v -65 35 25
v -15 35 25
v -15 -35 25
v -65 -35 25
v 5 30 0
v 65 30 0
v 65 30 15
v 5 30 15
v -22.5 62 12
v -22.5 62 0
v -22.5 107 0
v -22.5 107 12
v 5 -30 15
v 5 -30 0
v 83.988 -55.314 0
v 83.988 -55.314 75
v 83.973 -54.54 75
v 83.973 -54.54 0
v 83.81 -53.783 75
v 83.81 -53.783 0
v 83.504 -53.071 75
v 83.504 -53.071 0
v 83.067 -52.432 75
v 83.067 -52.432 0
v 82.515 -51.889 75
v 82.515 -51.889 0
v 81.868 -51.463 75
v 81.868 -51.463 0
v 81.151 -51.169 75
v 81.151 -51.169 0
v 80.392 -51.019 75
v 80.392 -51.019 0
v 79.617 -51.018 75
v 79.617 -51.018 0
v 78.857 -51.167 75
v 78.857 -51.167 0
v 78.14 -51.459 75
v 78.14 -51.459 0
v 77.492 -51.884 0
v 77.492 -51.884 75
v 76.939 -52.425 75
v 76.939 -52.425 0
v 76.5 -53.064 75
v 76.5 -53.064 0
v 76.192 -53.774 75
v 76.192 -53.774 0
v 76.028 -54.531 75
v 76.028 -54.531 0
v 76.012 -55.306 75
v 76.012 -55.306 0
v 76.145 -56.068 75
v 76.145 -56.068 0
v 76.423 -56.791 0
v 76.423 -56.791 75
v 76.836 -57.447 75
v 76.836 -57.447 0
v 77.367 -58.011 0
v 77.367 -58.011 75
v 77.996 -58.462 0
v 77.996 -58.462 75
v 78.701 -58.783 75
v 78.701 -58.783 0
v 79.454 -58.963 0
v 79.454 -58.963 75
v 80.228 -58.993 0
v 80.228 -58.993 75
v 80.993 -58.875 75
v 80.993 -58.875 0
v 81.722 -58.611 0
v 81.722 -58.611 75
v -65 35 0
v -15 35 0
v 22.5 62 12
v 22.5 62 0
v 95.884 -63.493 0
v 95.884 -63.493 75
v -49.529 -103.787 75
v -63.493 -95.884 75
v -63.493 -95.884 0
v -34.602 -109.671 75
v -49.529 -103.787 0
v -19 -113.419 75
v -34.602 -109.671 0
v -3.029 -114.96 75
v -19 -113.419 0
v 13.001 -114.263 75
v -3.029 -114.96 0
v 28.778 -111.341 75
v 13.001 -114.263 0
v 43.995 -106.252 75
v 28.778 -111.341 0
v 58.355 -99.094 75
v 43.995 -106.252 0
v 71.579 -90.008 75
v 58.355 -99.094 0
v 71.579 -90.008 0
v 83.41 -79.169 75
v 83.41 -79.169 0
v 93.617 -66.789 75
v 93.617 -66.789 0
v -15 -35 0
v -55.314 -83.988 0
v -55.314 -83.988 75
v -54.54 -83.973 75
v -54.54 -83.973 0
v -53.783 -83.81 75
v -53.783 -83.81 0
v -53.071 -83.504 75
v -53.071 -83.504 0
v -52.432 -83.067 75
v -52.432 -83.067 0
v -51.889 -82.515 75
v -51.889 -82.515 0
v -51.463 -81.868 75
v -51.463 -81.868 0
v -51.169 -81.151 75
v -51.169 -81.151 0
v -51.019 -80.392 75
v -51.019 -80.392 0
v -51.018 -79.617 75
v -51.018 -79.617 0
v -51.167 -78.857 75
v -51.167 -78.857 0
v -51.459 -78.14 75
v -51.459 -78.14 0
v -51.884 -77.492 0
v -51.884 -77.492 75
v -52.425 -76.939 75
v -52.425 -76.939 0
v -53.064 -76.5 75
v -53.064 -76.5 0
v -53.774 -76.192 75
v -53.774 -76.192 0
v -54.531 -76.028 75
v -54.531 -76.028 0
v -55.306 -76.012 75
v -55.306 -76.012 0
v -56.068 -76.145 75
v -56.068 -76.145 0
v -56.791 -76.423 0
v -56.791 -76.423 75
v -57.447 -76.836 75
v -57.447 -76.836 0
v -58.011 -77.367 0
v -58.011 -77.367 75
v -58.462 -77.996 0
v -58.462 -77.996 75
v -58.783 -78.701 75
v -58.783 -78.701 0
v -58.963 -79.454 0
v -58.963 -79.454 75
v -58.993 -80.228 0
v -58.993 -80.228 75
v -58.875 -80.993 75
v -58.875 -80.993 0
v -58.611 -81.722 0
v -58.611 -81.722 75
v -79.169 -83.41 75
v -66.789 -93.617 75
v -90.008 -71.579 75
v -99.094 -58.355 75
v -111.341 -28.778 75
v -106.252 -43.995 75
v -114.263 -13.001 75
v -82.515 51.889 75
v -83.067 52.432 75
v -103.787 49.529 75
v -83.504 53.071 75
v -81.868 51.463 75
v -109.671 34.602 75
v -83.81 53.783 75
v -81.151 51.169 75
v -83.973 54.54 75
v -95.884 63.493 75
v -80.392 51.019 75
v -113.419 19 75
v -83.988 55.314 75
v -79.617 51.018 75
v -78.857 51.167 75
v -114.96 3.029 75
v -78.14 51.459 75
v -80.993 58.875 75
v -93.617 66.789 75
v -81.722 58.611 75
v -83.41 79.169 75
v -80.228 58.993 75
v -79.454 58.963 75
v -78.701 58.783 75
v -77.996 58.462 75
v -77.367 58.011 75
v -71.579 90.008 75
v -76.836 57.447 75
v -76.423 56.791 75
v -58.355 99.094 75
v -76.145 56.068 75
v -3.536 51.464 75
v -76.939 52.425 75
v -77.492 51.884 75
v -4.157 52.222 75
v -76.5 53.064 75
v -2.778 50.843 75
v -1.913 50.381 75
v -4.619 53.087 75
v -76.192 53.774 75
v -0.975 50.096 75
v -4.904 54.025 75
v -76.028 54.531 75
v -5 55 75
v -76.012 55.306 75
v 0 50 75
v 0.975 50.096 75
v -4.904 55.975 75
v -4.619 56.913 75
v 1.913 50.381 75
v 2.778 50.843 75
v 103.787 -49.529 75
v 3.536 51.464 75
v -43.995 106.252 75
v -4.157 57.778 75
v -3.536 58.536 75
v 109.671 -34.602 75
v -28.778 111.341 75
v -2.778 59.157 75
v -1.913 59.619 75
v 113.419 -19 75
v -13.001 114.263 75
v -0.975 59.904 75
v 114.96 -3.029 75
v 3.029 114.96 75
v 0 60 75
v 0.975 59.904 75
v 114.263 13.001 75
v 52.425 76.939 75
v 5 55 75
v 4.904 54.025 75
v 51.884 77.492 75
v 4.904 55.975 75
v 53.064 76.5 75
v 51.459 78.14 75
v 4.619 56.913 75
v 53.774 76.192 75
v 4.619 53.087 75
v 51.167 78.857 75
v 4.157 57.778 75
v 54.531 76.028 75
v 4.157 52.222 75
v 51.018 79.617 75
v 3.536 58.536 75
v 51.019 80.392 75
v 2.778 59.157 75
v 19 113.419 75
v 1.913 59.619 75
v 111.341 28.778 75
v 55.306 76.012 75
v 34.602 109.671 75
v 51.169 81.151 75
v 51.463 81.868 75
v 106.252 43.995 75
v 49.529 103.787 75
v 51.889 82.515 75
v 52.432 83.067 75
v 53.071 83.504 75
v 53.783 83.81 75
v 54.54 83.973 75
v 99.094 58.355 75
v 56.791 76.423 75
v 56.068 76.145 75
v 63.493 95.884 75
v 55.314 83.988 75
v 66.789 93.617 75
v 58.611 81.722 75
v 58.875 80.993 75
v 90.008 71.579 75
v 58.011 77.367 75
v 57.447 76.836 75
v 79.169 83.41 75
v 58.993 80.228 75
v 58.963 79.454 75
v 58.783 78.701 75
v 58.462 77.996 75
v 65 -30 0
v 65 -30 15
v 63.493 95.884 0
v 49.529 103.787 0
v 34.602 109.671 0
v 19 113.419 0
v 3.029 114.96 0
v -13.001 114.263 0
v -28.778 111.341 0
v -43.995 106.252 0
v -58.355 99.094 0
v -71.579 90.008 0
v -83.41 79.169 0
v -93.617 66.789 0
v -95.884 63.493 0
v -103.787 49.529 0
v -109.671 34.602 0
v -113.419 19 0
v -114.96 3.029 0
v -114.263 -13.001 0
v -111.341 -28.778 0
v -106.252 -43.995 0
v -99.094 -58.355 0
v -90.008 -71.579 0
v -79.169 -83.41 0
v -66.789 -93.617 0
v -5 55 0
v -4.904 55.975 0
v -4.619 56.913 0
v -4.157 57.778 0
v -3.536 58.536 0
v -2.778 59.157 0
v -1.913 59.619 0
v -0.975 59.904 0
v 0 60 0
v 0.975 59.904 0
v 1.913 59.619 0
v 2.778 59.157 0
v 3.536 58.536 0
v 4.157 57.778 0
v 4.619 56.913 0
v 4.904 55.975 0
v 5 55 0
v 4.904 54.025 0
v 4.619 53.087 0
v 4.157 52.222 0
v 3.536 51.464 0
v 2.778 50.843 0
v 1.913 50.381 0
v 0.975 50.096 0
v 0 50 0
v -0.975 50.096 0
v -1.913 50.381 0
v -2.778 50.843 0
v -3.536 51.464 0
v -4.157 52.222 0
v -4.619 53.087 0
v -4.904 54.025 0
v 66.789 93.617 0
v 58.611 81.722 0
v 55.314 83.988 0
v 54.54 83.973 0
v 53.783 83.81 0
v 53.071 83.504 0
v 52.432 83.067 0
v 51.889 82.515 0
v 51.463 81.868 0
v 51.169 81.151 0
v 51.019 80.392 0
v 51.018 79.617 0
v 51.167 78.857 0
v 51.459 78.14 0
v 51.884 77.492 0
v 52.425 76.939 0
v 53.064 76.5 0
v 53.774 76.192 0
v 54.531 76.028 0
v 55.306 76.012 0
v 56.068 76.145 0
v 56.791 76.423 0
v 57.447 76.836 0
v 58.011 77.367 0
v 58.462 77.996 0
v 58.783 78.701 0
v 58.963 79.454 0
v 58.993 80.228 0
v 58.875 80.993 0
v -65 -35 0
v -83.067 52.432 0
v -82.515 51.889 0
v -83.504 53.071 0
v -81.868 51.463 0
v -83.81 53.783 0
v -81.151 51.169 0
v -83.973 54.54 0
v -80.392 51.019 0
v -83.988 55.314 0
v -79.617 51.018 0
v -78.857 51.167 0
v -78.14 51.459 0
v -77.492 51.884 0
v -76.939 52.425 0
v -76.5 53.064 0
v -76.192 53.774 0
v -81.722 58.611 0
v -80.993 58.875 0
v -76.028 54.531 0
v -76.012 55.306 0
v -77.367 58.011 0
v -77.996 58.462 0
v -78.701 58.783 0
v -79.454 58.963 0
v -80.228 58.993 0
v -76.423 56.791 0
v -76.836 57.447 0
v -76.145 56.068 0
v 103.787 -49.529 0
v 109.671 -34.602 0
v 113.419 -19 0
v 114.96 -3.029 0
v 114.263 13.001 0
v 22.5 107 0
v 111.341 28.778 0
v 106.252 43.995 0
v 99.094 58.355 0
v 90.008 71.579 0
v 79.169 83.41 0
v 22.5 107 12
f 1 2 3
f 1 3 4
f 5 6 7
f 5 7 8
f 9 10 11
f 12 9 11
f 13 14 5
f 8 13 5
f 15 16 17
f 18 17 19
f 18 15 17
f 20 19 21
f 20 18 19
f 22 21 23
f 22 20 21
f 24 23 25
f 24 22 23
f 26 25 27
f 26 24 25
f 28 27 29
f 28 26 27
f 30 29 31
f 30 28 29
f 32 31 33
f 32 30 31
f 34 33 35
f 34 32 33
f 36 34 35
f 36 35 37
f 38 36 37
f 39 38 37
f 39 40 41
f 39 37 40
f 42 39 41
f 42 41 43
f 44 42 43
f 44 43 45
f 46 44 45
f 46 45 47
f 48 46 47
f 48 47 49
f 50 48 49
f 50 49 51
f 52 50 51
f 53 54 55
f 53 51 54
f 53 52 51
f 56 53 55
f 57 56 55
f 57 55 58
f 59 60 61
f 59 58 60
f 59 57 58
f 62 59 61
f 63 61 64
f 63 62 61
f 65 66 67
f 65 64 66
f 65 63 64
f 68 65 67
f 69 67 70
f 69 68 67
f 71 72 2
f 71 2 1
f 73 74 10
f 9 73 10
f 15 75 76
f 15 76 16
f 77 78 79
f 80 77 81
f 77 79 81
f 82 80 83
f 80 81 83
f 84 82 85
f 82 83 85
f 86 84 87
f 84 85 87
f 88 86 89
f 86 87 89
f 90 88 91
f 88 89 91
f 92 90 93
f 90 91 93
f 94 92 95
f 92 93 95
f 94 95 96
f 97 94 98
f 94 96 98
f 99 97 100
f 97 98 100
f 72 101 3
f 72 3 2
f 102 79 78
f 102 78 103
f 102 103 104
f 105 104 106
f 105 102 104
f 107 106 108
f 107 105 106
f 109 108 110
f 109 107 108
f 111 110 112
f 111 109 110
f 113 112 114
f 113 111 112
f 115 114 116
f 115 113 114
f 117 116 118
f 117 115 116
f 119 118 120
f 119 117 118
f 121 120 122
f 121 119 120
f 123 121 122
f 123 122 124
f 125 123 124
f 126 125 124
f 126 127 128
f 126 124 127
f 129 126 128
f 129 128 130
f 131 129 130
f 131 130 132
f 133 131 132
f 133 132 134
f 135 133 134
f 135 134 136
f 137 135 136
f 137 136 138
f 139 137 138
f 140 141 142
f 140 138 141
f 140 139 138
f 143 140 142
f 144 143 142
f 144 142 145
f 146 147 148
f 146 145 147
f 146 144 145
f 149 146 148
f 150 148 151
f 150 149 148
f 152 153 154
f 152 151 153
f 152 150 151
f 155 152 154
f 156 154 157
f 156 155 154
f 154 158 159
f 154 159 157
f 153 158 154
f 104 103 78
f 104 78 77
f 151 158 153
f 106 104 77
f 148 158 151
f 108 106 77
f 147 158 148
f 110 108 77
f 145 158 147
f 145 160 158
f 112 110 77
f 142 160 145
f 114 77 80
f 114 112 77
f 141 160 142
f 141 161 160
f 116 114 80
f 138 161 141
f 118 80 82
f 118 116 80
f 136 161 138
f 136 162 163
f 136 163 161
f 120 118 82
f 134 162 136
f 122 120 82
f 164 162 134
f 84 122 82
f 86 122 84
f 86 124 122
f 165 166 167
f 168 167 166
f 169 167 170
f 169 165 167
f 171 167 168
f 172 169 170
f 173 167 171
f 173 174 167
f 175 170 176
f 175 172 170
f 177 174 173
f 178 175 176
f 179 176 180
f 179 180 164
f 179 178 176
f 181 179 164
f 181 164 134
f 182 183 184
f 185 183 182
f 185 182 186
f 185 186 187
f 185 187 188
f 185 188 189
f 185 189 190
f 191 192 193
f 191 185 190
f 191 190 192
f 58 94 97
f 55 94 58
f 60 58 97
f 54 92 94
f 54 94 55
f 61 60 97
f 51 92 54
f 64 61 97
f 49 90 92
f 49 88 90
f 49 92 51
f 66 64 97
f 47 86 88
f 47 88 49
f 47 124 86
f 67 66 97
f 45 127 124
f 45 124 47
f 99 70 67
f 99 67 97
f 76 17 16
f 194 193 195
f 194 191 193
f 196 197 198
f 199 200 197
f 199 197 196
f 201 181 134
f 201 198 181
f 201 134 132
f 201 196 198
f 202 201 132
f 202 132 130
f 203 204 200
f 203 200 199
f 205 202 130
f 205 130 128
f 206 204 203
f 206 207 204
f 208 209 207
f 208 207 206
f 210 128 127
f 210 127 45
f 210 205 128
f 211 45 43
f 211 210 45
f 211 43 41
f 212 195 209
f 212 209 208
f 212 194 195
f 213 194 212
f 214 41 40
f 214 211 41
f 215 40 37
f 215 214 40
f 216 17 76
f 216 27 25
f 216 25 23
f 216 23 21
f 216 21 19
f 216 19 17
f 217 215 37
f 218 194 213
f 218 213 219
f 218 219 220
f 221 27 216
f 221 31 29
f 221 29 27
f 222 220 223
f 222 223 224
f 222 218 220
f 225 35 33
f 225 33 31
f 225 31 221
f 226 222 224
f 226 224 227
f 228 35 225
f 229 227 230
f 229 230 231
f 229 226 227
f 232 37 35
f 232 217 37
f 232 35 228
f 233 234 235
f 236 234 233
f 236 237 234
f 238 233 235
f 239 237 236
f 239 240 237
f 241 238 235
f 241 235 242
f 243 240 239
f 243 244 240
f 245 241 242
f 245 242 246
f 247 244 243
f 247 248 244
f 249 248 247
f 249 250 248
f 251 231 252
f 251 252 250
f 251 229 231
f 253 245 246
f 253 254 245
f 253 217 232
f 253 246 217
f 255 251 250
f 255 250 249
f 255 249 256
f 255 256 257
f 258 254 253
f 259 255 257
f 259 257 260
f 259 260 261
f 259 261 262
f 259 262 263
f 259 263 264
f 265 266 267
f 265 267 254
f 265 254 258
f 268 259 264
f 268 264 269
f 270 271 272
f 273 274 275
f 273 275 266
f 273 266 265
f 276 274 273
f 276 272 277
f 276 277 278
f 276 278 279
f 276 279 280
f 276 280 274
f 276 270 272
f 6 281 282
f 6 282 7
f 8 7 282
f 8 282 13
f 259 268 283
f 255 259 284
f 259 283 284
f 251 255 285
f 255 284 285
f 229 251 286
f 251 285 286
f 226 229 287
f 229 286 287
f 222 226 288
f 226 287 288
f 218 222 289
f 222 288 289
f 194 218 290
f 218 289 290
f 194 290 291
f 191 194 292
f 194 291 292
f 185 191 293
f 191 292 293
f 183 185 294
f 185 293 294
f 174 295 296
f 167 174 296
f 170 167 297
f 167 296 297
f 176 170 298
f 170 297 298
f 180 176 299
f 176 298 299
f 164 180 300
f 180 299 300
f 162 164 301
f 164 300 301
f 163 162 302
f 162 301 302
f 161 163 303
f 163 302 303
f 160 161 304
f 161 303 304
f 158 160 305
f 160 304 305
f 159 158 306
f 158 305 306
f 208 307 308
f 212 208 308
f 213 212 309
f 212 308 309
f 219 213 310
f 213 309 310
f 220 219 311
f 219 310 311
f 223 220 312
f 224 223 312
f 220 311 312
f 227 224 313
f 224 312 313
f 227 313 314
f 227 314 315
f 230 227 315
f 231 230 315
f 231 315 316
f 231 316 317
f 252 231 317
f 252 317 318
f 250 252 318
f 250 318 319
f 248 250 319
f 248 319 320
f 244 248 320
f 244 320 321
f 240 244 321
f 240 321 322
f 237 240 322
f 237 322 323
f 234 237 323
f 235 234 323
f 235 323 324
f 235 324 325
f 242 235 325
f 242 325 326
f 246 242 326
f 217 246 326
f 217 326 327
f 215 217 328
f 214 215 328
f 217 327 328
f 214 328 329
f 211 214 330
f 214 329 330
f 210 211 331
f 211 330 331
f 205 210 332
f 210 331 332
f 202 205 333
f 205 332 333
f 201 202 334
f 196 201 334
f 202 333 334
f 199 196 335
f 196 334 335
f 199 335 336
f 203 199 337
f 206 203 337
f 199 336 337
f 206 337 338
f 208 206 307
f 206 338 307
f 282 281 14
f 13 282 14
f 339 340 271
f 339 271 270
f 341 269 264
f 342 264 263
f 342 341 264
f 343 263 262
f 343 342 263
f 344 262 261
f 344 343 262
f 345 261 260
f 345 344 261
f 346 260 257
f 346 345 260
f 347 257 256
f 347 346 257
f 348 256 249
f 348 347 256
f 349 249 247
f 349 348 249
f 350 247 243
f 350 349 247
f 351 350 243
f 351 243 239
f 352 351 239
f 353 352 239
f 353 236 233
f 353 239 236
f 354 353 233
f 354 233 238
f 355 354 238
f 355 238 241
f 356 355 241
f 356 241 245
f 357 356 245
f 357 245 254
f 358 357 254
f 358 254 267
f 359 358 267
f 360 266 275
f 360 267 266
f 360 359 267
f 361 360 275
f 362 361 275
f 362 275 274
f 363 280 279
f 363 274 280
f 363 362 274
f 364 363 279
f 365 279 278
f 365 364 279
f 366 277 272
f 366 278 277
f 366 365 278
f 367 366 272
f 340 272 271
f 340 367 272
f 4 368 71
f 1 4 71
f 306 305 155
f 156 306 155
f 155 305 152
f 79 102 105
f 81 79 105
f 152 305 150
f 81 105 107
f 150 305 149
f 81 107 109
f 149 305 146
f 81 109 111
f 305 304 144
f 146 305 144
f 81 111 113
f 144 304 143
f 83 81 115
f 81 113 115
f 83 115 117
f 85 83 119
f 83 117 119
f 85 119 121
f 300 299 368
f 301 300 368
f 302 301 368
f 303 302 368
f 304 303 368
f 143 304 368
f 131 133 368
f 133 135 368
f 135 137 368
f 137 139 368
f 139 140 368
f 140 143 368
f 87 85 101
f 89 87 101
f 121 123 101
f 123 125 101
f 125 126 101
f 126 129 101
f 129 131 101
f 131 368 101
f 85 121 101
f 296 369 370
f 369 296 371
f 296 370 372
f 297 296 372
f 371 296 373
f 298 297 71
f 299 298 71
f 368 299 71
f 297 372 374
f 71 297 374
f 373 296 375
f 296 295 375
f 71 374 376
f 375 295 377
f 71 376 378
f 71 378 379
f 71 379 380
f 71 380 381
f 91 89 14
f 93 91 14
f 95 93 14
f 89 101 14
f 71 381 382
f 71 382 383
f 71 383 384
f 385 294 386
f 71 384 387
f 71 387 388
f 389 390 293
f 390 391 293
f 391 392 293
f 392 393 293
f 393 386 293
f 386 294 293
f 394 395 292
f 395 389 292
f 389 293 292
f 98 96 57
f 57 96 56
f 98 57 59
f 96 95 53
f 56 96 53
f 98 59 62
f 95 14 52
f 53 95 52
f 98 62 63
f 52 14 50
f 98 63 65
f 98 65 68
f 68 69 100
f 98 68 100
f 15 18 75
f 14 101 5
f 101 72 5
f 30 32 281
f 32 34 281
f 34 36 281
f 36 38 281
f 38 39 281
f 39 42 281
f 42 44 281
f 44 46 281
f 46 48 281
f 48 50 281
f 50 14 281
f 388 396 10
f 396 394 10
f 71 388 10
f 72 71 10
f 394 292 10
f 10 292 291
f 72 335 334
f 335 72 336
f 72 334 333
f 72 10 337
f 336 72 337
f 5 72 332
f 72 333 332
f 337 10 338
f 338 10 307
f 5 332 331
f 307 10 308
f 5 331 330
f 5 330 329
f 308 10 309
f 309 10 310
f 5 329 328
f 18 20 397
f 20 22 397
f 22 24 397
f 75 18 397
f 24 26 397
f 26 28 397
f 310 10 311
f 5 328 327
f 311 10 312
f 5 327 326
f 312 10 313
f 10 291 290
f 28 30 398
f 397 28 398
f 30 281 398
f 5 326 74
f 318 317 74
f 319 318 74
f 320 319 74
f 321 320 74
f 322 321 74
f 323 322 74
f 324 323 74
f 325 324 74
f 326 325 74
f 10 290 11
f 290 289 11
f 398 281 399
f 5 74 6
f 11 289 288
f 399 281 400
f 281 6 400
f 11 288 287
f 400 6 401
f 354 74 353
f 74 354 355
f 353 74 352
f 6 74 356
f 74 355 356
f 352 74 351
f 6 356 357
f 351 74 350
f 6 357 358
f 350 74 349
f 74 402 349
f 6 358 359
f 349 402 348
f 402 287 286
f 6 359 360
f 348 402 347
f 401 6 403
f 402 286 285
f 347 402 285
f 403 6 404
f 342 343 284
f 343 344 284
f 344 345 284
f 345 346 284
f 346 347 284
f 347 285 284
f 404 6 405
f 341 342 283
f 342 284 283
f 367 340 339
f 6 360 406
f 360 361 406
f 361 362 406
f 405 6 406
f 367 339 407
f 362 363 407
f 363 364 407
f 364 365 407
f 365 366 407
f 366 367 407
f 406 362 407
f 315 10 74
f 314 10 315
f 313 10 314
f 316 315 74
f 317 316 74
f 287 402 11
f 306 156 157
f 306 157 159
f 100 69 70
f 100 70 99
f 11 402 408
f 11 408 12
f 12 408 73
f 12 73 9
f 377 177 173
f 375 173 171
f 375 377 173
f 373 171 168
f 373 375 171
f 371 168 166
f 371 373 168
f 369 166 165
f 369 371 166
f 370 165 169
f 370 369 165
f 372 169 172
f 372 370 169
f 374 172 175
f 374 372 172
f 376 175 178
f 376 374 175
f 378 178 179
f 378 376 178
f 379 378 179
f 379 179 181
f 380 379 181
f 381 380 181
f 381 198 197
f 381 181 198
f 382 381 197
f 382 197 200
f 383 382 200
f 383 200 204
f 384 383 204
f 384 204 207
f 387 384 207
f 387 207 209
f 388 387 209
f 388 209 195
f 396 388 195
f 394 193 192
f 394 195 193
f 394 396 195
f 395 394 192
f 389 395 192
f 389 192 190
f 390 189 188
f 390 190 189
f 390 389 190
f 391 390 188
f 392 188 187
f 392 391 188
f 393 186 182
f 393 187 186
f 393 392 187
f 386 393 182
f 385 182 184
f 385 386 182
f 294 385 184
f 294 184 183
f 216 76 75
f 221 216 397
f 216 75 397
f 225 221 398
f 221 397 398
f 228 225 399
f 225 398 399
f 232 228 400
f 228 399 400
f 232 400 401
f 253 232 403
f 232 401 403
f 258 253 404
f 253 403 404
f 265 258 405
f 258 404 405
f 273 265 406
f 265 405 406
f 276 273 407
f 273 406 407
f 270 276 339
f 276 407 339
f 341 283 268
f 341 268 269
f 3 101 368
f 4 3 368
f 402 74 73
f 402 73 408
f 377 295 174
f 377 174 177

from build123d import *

# Parameters (mm, degrees)
SCHIZZO1_R                   = 115
ESTRUSIONE_ESTRUSIONE1_DEPTH = 75
TAGLIO_ESTRUSIONE1_REACH     = 77
SCHIZZO3_W                   = 60
SCHIZZO3_H                   = 60
TAGLIO_ESTRUSIONE2_DEPTH     = 15
SCHIZZO4_W                   = 50
SCHIZZO4_H                   = 70
TAGLIO_ESTRUSIONE3_DEPTH     = 25
SCHIZZO5_R                   = 5
TAGLIO_ESTRUSIONE4_DEPTH     = 76
SCHIZZO6_W                   = 45
SCHIZZO6_H                   = 45
TAGLIO_ESTRUSIONE5_DEPTH     = 12


with BuildPart() as part:
    # Schizzo1 → Estrusione-Estrusione1 (new body)
    with BuildSketch(Plane.XY):
        Circle(SCHIZZO1_R)
    extrude(amount=ESTRUSIONE_ESTRUSIONE1_DEPTH)

    # Schizzo2 → Taglio-Estrusione1 (cut, up to next)
    with BuildSketch(Plane(origin=(0, 0, 0), x_dir=(-1, 0, 0), z_dir=(0, 0, -1)), mode=Mode.PRIVATE) as taglio_estrusione1_sk1:
        with BuildLine():
            Line((58.610597259, -81.721507315), (66.78904506, -93.617431389))
            ThreePointArc((66.78904506, -93.617431389), (65.150814632, -94.764821283), (63.492877363, -95.883546681))
            Line((63.492877363, -95.883546681), (55.314429562, -83.987622606))
            ThreePointArc((55.314429562, -83.987622606), (52.733884708, -76.703832303), (58.610597259, -81.721507315))
        make_face()
    taglio_estrusione1_tool1 = extrude(taglio_estrusione1_sk1.sketch, amount=-TAGLIO_ESTRUSIONE1_REACH, mode=Mode.PRIVATE) & part.part
    add(taglio_estrusione1_tool1.solids().sort_by_distance((-58.254036, -84.733143, 0))[0], mode=Mode.SUBTRACT)
    # Schizzo2 → Taglio-Estrusione1 (cut, up to next)
    with BuildSketch(Plane(origin=(0, 0, 0), x_dir=(-1, 0, 0), z_dir=(0, 0, -1)), mode=Mode.PRIVATE) as taglio_estrusione1_sk2:
        with BuildLine():
            Line((81.721507315, 58.610597259), (93.617431389, 66.78904506))
            ThreePointArc((93.617431389, 66.78904506), (94.764821283, 65.150814632), (95.883546681, 63.492877363))
            Line((95.883546681, 63.492877363), (83.987622606, 55.314429562))
            ThreePointArc((83.987622606, 55.314429562), (76.703832303, 52.733884708), (81.721507315, 58.610597259))
        make_face()
    taglio_estrusione1_tool2 = extrude(taglio_estrusione1_sk2.sketch, amount=-TAGLIO_ESTRUSIONE1_REACH, mode=Mode.PRIVATE) & part.part
    add(taglio_estrusione1_tool2.solids().sort_by_distance((-84.733143, 58.254036, 0))[0], mode=Mode.SUBTRACT)
    # Schizzo2 → Taglio-Estrusione1 (cut, up to next)
    with BuildSketch(Plane(origin=(0, 0, 0), x_dir=(-1, 0, 0), z_dir=(0, 0, -1)), mode=Mode.PRIVATE) as taglio_estrusione1_sk3:
        with BuildLine():
            Line((-58.610597259, 81.721507315), (-66.78904506, 93.617431389))
            ThreePointArc((-66.78904506, 93.617431389), (-65.150814632, 94.764821283), (-63.492877363, 95.883546681))
            Line((-63.492877363, 95.883546681), (-55.314429562, 83.987622606))
            ThreePointArc((-55.314429562, 83.987622606), (-52.733884708, 76.703832303), (-58.610597259, 81.721507315))
        make_face()
    taglio_estrusione1_tool3 = extrude(taglio_estrusione1_sk3.sketch, amount=-TAGLIO_ESTRUSIONE1_REACH, mode=Mode.PRIVATE) & part.part
    add(taglio_estrusione1_tool3.solids().sort_by_distance((58.254036, 84.733143, 0))[0], mode=Mode.SUBTRACT)
    # Schizzo2 → Taglio-Estrusione1 (cut, up to next)
    with BuildSketch(Plane(origin=(0, 0, 0), x_dir=(-1, 0, 0), z_dir=(0, 0, -1)), mode=Mode.PRIVATE) as taglio_estrusione1_sk4:
        with BuildLine():
            Line((-81.721507315, -58.610597259), (-93.617431389, -66.78904506))
            ThreePointArc((-93.617431389, -66.78904506), (-94.764821283, -65.150814632), (-95.883546681, -63.492877363))
            Line((-95.883546681, -63.492877363), (-83.987622606, -55.314429562))
            ThreePointArc((-83.987622606, -55.314429562), (-76.703832303, -52.733884708), (-81.721507315, -58.610597259))
        make_face()
    taglio_estrusione1_tool4 = extrude(taglio_estrusione1_sk4.sketch, amount=-TAGLIO_ESTRUSIONE1_REACH, mode=Mode.PRIVATE) & part.part
    add(taglio_estrusione1_tool4.solids().sort_by_distance((84.733143, -58.254036, 0))[0], mode=Mode.SUBTRACT)

    # Schizzo3 → Taglio-Estrusione2 (cut)
    with BuildSketch(Plane(origin=(0, 0, 0), x_dir=(-1, 0, 0), z_dir=(0, 0, -1))):
        with Locations((-35, 0)):
            Rectangle(SCHIZZO3_W, SCHIZZO3_H)
    extrude(amount=-TAGLIO_ESTRUSIONE2_DEPTH, mode=Mode.SUBTRACT)

    # Schizzo4 → Taglio-Estrusione3 (cut)
    with BuildSketch(Plane(origin=(0, 0, 0), x_dir=(-1, 0, 0), z_dir=(0, 0, -1))):
        with Locations((40, 0)):
            Rectangle(SCHIZZO4_W, SCHIZZO4_H)
    extrude(amount=-TAGLIO_ESTRUSIONE3_DEPTH, mode=Mode.SUBTRACT)

    # Schizzo5 → Taglio-Estrusione4 (cut, through all)
    with BuildSketch(Plane(origin=(0, 0, 0), x_dir=(-1, 0, 0), z_dir=(0, 0, -1))):
        with Locations((0, 55)):
            Circle(SCHIZZO5_R)
    extrude(amount=-TAGLIO_ESTRUSIONE4_DEPTH, mode=Mode.SUBTRACT)

    # Schizzo6 → Taglio-Estrusione5 (cut)
    with BuildSketch(Plane(origin=(0, 0, 0), x_dir=(-1, 0, 0), z_dir=(0, 0, -1))):
        with Locations((0, 84.5)):
            Rectangle(SCHIZZO6_W, SCHIZZO6_H)
    extrude(amount=-TAGLIO_ESTRUSIONE5_DEPTH, mode=Mode.SUBTRACT)


solid = part.part
